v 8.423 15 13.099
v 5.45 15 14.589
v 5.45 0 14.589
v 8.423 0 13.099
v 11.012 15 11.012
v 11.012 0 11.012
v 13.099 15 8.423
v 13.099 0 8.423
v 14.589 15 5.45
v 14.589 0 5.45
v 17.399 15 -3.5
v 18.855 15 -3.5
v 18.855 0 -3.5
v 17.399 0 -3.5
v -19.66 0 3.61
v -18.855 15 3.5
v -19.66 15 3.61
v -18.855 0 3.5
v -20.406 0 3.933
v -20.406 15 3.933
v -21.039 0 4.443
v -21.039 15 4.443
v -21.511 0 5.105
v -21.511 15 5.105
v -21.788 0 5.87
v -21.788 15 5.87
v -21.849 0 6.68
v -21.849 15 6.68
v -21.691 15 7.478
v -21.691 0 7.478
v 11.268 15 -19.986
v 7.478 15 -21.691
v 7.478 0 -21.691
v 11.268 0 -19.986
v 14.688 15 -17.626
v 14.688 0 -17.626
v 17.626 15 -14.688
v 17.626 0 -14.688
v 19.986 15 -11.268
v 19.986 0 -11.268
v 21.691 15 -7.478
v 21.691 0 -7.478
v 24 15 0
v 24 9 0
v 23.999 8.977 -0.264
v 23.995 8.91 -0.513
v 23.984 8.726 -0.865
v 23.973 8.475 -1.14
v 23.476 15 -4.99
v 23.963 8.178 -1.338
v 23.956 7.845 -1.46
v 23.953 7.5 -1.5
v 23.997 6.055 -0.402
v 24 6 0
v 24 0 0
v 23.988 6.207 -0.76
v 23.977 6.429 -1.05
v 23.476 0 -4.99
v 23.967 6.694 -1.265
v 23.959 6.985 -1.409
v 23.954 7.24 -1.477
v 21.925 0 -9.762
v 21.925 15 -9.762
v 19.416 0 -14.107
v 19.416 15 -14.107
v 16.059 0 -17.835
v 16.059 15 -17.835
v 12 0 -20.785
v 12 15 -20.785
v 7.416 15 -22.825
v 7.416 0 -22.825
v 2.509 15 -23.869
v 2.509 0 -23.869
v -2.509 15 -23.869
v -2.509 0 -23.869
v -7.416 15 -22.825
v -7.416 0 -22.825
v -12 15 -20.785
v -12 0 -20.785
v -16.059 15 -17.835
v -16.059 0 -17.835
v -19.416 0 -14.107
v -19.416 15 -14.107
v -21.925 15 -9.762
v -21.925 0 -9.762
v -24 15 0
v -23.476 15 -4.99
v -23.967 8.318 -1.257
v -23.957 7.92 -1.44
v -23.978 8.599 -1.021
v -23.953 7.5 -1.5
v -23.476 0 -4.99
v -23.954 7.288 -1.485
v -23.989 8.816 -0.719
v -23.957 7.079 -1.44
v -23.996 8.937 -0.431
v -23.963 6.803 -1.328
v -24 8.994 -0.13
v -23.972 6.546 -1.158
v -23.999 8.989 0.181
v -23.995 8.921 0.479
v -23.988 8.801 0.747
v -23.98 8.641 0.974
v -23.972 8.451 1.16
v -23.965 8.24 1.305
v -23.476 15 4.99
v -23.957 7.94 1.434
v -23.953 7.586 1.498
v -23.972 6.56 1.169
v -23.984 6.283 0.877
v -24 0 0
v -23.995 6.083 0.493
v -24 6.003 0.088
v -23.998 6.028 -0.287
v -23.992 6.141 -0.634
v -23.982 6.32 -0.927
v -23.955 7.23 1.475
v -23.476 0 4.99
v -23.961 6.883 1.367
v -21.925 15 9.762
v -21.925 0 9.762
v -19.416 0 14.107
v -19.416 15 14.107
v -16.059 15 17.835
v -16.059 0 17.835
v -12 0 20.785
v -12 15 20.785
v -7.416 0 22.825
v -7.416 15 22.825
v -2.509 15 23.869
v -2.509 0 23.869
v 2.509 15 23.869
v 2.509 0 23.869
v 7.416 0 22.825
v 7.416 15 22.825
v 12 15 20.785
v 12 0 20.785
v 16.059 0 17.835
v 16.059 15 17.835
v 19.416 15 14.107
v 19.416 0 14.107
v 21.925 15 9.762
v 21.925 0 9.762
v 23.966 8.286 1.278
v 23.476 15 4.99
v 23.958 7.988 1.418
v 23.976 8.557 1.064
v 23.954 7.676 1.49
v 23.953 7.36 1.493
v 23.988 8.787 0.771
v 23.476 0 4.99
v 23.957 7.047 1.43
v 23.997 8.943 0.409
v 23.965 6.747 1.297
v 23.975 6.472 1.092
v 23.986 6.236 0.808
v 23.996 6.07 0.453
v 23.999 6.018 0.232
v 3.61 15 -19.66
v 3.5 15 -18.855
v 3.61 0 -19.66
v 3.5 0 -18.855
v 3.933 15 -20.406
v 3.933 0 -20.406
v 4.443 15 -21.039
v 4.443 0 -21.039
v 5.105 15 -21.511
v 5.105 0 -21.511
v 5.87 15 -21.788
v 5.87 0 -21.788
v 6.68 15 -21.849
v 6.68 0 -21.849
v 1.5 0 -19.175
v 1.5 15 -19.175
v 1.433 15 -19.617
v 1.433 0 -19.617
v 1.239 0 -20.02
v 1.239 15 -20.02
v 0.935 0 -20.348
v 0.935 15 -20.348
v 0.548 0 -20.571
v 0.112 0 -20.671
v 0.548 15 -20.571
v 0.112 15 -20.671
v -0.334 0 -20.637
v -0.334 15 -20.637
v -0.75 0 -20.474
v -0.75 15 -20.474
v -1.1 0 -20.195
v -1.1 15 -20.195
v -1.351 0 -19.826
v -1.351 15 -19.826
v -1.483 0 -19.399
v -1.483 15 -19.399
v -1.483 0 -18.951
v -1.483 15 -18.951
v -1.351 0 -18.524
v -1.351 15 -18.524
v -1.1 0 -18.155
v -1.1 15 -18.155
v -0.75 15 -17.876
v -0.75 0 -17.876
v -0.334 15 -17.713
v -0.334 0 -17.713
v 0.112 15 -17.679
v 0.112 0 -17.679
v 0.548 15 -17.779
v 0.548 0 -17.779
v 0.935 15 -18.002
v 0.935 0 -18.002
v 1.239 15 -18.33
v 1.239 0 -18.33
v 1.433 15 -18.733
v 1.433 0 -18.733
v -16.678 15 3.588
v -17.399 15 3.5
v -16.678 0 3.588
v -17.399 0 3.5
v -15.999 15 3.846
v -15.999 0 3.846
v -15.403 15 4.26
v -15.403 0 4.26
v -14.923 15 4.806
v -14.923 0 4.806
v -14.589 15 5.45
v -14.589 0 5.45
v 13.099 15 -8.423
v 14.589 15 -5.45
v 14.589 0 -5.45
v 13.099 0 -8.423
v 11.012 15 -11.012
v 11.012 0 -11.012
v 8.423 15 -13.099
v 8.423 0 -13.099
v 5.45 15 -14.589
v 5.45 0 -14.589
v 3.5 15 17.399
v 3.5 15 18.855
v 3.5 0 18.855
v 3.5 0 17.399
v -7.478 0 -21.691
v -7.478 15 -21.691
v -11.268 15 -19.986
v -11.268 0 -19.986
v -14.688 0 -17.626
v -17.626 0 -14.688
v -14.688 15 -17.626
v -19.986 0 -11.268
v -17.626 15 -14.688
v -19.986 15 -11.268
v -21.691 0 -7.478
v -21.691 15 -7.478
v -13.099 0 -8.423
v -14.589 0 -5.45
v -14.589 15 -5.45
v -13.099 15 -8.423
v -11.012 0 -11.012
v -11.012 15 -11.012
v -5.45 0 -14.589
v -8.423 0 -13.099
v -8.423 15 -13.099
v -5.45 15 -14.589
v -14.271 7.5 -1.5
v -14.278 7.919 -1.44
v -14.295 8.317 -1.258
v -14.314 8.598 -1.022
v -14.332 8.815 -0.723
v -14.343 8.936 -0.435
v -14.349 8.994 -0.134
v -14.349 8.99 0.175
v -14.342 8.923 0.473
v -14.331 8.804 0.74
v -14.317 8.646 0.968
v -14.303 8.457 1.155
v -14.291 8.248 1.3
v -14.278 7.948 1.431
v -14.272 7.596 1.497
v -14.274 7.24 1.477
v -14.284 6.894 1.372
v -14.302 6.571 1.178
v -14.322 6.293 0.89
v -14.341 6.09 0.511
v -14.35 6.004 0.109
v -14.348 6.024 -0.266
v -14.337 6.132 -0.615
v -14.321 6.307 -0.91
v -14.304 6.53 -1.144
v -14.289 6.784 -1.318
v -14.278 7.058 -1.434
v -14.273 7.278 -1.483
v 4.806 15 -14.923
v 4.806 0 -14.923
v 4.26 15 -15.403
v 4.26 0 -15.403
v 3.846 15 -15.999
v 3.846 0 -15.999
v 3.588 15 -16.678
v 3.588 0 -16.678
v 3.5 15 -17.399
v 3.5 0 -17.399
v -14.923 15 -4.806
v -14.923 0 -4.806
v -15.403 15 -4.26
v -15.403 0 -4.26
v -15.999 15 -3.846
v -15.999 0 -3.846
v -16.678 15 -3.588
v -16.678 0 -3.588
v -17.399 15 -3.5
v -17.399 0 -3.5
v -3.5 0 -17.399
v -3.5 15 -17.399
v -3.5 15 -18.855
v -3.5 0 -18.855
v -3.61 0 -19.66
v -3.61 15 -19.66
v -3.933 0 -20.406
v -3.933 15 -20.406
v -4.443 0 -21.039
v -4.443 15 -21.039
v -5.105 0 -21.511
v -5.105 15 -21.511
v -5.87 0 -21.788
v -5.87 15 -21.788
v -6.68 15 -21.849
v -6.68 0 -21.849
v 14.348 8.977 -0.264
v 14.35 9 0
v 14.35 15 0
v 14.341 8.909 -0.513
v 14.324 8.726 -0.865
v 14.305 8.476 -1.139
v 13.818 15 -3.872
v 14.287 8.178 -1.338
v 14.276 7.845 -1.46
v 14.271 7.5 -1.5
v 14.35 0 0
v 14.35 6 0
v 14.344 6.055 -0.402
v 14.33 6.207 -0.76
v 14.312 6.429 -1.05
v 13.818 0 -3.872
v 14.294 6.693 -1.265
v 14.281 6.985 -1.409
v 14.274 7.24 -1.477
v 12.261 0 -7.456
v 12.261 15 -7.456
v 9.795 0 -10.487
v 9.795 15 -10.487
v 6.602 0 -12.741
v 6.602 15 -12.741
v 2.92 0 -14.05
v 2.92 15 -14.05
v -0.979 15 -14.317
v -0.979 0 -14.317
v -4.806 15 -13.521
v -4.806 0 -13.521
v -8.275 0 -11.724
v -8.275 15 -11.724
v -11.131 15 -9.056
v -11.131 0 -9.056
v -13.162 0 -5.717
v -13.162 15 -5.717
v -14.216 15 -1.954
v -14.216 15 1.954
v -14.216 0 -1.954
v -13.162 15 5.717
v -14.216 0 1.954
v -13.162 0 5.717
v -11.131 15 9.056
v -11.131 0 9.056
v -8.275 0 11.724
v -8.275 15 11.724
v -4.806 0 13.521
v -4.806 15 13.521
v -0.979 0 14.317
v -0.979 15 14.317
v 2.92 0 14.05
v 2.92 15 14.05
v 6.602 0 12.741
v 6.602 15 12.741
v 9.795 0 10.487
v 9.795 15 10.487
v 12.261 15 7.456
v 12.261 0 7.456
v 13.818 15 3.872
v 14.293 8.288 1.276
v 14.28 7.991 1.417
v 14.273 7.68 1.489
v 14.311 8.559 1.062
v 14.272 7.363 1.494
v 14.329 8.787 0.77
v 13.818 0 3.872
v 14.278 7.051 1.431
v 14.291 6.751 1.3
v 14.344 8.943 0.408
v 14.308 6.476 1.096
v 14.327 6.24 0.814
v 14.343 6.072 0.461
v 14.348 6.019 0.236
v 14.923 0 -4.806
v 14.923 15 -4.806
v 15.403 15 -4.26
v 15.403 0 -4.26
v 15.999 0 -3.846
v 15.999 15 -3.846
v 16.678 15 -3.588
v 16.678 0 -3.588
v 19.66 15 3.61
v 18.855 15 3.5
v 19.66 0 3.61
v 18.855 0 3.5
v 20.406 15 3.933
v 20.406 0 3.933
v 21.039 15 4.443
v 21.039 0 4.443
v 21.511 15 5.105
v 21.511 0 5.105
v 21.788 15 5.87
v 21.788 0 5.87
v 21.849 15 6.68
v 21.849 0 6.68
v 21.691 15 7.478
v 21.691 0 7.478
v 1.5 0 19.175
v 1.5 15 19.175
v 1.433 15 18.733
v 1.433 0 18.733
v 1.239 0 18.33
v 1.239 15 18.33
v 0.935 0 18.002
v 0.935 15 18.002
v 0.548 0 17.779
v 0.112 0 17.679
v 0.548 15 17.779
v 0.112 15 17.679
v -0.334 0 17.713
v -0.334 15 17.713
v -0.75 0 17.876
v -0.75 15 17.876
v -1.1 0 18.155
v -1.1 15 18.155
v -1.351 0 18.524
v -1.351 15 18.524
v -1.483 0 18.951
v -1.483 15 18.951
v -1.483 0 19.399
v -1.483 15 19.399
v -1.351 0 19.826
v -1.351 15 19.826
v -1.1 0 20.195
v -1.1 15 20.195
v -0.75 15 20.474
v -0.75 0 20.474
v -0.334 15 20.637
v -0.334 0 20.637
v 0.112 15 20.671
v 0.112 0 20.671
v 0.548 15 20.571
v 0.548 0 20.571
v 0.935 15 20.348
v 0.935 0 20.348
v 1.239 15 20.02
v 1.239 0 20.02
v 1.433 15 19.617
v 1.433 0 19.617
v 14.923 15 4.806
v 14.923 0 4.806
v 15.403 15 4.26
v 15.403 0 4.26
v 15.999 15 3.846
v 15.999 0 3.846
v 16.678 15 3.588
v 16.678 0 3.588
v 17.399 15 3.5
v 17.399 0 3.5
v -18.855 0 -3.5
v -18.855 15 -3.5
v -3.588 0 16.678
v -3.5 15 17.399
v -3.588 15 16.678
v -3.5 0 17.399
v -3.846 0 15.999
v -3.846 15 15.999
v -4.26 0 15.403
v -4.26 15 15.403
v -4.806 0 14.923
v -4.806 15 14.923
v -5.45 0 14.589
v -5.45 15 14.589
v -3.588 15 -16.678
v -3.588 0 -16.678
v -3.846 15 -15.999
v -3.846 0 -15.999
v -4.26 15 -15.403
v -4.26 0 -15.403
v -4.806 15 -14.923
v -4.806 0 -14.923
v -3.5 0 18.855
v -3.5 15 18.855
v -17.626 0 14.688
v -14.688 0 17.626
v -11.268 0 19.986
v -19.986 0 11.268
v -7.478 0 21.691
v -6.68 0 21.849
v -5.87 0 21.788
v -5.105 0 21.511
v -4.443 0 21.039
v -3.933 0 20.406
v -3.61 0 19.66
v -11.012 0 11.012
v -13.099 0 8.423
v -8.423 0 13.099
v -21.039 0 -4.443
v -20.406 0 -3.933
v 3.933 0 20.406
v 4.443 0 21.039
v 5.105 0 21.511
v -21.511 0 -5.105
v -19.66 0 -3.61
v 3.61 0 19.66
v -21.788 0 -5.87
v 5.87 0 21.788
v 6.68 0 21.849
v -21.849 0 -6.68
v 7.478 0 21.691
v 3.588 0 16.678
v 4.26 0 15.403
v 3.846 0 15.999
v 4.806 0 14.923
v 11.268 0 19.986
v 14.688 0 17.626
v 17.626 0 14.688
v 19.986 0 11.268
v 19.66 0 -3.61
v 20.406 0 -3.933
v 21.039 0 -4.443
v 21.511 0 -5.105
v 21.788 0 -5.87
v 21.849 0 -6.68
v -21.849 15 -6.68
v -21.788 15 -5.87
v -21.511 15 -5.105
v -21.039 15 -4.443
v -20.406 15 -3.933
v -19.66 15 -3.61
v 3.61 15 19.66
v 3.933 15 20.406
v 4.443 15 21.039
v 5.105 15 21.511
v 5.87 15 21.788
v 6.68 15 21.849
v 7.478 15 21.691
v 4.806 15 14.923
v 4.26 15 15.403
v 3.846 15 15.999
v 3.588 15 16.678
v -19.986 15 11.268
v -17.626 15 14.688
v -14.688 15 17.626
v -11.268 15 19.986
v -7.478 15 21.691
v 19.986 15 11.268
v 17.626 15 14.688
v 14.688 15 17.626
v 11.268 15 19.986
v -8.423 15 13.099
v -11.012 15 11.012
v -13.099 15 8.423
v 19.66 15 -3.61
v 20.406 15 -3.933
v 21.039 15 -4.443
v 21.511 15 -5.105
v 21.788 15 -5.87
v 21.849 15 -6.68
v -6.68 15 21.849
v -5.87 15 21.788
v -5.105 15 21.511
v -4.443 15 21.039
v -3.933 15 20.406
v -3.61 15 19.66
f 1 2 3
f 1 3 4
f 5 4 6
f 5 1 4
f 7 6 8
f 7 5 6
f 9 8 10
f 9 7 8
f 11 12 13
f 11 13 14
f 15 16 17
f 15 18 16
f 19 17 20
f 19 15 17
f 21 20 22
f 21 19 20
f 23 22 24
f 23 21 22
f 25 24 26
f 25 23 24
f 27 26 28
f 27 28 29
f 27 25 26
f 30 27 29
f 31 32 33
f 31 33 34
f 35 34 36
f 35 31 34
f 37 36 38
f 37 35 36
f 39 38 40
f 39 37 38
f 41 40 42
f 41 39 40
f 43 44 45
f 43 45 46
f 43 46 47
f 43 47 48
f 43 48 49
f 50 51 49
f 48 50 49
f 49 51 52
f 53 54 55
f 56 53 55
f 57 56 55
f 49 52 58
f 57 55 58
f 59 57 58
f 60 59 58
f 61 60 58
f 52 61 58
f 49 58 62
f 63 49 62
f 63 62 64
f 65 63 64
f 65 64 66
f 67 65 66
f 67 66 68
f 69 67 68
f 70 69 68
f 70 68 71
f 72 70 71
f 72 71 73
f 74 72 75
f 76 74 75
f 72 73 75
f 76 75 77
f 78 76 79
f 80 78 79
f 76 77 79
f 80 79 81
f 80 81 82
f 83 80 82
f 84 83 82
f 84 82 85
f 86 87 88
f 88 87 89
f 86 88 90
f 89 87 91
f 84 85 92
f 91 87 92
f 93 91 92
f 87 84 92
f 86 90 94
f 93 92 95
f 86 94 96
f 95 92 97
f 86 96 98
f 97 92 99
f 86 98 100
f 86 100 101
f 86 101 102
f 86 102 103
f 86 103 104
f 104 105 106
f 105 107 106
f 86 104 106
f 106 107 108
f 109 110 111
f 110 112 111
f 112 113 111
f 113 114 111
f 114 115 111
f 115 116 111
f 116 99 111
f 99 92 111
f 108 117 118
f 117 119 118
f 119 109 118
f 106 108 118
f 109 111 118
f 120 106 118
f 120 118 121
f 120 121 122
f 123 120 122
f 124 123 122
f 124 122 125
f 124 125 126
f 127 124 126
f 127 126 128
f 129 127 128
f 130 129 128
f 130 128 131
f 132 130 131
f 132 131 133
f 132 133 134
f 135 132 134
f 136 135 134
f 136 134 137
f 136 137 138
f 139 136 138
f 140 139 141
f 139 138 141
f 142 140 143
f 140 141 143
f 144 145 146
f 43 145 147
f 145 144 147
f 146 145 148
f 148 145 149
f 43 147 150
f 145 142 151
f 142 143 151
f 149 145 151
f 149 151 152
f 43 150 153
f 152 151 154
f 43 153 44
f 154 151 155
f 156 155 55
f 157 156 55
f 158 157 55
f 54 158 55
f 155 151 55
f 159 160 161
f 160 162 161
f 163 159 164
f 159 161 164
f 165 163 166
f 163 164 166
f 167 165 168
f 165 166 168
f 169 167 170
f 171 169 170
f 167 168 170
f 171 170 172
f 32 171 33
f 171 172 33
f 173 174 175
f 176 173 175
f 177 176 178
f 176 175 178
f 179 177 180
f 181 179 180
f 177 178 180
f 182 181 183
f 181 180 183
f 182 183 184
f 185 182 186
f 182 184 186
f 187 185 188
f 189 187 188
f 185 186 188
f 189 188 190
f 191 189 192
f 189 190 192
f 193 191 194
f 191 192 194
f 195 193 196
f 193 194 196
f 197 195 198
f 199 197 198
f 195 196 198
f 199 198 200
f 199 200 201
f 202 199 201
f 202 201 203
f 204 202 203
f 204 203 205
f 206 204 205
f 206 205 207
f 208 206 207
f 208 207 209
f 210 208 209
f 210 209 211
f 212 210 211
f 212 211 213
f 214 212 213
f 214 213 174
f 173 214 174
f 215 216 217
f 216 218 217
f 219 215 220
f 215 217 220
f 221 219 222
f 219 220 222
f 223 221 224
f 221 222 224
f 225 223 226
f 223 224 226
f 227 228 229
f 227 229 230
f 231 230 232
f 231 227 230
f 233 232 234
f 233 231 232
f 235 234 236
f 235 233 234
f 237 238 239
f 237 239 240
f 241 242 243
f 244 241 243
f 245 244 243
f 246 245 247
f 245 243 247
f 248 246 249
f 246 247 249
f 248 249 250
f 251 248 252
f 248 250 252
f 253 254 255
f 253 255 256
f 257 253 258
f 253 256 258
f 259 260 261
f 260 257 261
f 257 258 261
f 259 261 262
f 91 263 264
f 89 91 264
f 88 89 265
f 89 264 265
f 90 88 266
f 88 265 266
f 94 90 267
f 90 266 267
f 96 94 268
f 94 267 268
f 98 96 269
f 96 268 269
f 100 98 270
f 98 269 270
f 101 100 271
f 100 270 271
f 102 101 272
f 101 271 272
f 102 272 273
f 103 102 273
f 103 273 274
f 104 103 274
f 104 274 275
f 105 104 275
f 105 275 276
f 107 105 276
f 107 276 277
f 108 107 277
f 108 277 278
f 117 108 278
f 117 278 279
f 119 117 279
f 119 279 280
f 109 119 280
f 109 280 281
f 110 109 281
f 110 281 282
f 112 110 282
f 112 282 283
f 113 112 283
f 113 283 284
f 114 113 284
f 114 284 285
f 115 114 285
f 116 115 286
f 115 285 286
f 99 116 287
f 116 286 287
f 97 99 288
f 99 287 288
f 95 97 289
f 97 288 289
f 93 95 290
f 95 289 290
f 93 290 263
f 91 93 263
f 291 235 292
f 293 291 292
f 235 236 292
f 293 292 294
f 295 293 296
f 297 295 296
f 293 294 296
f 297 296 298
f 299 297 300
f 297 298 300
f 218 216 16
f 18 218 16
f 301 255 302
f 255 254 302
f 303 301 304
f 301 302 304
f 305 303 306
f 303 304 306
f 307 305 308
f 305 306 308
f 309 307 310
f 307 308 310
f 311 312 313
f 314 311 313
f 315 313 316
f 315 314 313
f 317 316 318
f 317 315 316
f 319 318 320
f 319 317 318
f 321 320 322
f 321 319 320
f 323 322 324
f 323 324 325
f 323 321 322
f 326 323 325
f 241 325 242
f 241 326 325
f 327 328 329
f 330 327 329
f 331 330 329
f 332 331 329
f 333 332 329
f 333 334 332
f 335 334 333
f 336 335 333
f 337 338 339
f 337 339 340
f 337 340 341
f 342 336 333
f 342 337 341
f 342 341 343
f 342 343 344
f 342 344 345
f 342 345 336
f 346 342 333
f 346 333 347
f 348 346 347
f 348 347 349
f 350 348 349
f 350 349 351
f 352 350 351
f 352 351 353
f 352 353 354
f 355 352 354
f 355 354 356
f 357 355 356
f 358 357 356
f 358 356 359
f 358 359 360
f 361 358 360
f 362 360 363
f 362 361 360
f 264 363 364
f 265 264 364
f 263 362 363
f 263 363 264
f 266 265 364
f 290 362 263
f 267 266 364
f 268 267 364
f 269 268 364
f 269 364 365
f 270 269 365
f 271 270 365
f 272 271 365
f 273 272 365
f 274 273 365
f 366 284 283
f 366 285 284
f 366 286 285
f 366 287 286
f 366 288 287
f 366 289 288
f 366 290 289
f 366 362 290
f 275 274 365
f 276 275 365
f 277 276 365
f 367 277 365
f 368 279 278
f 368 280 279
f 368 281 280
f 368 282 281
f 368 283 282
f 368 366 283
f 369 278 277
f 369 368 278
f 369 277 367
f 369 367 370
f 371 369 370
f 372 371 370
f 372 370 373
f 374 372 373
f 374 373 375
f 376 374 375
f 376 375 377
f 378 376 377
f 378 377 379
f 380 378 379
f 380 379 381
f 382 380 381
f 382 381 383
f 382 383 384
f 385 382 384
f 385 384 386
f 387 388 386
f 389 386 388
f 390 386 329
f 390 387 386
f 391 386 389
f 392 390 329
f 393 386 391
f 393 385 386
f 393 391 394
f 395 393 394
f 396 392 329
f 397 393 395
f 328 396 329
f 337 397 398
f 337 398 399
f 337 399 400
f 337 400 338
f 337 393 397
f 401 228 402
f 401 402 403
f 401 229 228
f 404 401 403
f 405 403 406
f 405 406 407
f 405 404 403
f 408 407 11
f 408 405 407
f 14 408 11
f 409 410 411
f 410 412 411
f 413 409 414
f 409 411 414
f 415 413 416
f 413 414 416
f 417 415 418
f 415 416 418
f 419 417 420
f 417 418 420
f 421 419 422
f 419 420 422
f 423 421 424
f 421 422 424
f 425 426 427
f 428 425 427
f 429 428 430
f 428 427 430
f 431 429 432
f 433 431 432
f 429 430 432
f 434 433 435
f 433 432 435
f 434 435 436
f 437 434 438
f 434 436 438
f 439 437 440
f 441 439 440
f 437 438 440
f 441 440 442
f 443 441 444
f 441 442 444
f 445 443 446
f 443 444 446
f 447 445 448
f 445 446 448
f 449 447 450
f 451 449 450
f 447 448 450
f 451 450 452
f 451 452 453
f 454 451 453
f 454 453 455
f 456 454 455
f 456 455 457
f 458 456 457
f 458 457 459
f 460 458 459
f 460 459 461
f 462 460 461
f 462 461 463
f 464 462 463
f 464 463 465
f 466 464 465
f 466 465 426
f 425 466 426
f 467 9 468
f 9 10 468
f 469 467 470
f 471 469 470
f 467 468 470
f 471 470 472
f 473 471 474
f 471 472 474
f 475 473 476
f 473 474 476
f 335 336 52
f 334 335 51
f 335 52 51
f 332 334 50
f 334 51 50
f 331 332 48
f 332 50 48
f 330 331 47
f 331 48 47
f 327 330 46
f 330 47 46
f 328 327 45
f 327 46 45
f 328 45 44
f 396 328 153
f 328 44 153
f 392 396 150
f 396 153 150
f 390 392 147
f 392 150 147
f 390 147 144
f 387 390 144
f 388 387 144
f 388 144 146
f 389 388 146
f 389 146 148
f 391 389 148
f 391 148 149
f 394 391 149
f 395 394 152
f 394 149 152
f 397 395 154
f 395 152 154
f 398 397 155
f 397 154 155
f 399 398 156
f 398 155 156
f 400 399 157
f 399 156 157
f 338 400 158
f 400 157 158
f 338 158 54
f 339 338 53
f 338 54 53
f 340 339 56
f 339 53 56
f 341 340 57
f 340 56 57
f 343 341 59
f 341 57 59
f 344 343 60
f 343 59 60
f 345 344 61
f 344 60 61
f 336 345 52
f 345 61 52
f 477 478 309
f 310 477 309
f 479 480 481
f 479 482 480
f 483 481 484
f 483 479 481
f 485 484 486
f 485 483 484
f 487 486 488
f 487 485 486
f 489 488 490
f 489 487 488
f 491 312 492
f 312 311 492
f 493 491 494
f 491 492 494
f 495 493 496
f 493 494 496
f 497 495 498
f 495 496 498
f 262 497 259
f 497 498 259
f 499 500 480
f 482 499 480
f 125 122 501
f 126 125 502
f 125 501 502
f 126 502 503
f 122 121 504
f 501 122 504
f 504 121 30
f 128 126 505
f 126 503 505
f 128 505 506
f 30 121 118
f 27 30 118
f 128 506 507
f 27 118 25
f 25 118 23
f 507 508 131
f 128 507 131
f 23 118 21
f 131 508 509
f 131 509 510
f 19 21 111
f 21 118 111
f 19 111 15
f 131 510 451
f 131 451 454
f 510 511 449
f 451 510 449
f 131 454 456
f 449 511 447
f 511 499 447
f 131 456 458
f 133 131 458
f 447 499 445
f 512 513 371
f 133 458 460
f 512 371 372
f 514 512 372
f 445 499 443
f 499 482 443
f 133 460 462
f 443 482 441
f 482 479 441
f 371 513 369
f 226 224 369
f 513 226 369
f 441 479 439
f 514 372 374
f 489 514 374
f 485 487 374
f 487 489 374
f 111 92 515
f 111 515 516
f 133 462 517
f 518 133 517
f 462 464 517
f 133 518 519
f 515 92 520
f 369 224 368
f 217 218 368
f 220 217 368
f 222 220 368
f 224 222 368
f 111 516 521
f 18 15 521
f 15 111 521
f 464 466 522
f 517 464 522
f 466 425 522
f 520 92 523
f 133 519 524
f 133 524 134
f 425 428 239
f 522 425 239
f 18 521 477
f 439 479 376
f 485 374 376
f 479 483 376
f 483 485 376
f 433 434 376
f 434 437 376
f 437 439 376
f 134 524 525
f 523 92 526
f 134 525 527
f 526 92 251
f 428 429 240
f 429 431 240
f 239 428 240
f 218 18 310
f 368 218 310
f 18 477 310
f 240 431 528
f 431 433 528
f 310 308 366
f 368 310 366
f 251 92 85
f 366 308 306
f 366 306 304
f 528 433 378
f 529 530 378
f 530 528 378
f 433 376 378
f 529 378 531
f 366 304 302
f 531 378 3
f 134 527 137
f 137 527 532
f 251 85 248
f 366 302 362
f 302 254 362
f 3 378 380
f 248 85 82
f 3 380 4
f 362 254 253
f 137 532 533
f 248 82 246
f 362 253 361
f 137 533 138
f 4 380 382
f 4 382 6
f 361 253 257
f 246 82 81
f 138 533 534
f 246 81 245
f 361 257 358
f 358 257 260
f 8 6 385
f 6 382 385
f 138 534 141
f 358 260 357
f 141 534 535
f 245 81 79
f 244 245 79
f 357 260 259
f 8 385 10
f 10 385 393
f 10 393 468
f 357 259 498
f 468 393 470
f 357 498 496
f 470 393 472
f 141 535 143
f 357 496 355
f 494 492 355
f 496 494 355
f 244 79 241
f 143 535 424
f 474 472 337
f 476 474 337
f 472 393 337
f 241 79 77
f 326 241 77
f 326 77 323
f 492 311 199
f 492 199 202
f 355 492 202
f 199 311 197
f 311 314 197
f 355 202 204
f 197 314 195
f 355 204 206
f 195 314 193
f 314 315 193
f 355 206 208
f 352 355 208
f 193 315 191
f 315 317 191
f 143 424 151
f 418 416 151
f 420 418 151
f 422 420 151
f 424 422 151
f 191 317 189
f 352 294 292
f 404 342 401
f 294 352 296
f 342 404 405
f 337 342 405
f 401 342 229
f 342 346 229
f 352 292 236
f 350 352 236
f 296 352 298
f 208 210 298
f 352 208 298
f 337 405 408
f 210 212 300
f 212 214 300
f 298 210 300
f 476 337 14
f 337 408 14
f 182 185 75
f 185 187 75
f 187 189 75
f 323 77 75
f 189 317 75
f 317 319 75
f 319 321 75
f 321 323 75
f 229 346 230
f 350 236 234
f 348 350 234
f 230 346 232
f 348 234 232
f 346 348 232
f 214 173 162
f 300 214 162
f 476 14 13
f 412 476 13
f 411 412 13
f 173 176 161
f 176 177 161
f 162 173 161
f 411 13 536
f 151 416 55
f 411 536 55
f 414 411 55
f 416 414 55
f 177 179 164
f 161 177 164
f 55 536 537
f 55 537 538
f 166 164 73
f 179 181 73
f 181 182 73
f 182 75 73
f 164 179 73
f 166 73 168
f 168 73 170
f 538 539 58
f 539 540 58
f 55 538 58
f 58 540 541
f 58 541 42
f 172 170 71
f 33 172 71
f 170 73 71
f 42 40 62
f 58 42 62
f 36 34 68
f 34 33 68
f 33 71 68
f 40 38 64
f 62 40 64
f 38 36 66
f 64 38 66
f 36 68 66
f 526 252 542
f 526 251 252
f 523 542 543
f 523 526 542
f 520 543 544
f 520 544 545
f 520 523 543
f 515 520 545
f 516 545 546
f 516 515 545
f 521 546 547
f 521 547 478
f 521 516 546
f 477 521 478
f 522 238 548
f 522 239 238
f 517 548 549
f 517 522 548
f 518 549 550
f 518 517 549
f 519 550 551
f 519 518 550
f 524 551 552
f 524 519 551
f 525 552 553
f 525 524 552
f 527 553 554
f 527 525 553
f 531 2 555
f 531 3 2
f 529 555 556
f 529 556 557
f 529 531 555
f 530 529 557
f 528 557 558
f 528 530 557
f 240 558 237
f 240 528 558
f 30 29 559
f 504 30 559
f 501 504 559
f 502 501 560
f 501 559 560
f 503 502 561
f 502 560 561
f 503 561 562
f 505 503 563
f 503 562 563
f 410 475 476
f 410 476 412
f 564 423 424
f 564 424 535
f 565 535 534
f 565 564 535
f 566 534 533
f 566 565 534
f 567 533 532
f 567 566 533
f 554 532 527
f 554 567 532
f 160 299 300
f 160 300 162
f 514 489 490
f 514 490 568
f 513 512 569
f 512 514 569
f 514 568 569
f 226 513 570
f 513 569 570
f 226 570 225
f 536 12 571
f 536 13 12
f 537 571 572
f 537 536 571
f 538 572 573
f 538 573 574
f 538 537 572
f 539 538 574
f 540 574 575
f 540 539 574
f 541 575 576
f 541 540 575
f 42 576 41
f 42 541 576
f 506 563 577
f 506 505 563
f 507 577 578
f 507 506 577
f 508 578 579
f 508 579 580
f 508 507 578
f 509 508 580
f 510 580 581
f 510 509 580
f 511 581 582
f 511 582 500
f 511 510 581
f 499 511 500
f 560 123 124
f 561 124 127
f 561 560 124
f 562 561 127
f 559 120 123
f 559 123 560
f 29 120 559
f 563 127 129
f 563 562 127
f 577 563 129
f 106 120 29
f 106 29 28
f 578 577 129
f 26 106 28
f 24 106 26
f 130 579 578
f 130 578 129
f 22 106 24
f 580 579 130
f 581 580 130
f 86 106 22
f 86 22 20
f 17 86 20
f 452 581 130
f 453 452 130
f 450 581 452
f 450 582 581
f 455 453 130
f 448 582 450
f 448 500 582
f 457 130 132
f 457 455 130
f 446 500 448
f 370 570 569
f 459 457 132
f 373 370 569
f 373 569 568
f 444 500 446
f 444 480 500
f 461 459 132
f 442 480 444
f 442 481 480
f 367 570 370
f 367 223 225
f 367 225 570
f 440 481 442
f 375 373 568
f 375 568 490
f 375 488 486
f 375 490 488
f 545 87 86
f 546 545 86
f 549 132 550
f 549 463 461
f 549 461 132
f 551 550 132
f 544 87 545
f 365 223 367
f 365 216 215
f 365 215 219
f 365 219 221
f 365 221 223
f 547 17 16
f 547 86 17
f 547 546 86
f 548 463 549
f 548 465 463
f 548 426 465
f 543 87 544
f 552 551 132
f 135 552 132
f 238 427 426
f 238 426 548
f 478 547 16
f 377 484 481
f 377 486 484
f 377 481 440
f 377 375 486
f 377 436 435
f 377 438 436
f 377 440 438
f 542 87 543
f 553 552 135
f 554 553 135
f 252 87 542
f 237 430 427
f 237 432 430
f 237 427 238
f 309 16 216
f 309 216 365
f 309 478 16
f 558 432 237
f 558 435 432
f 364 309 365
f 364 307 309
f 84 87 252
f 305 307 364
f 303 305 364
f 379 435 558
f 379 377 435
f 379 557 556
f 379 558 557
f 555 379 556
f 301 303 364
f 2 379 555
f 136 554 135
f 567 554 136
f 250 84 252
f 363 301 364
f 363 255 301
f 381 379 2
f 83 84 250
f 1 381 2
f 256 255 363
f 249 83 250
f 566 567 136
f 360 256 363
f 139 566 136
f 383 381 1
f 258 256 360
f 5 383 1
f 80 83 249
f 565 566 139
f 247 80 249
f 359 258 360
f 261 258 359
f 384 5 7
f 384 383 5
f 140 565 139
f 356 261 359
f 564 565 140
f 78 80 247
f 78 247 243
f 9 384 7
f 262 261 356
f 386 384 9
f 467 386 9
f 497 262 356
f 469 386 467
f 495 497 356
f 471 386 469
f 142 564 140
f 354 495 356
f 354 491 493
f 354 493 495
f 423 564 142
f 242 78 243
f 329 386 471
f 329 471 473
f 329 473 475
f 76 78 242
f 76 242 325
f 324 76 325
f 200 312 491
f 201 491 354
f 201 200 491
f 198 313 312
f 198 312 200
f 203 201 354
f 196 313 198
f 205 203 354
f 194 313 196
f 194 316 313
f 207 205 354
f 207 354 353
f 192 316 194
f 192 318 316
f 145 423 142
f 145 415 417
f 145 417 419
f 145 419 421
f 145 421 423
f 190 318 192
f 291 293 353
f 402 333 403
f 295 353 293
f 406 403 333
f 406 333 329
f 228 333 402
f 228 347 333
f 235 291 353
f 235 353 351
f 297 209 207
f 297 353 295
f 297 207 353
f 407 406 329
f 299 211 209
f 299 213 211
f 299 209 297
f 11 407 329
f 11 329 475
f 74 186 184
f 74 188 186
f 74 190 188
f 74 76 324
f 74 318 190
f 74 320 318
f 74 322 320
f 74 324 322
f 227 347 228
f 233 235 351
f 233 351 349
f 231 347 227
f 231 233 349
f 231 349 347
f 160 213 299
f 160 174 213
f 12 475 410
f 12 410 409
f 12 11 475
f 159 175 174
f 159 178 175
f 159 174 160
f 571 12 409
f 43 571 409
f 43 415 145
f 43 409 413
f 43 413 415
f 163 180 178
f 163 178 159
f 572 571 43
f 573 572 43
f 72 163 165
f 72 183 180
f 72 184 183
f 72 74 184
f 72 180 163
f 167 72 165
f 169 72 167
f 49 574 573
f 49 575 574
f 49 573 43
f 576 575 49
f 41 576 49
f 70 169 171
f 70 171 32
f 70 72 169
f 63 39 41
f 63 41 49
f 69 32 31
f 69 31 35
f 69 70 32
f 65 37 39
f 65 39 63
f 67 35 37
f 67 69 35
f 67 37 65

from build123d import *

# Parameters (mm, degrees)
SKETCH3_R           = 24
SKETCH3_R_2         = 14.35
BOSS_EXTRUDE1_DEPTH = 15
CUT_EXTRUDE2_START  = 50
SKETCH4_R           = 1.5
CUT_EXTRUDE2_DEPTH  = 100
SKETCH5_R           = 1.5
CUT_EXTRUDE3_DEPTH  = 100
CUT_EXTRUDE6_DEPTH  = 26
CUT_EXTRUDE7_DEPTH  = 26
CUT_EXTRUDE8_DEPTH  = 26
CUT_EXTRUDE9_DEPTH  = 26
FILLET5_R           = 3


with BuildPart() as part:
    # Sketch3 → Boss-Extrude1 (new body)
    with BuildSketch(Plane(origin=(0, 0, 0), x_dir=(1, 0, 0), z_dir=(0, 1, 0))):
        Circle(SKETCH3_R)
        Circle(SKETCH3_R_2, mode=Mode.SUBTRACT)
    extrude(amount=BOSS_EXTRUDE1_DEPTH)

    # Sketch4 → Cut-Extrude2 (cut)
    with BuildSketch(Plane(origin=(0, 0, 0), x_dir=(0, 0, -1), z_dir=(1, 0, 0)).offset(CUT_EXTRUDE2_START)):
        with Locations((0, 7.5)):
            Circle(SKETCH4_R)
    extrude(amount=-CUT_EXTRUDE2_DEPTH, mode=Mode.SUBTRACT)

    # Sketch5 → Cut-Extrude3 (cut)
    with BuildSketch(Plane(origin=(0, 15, 0), x_dir=(1, 0, 0), z_dir=(0, 1, 0))):
        with Locations((0, 19.175)):
            Circle(SKETCH5_R)
        with Locations((0, -19.175)):
            Circle(SKETCH5_R)
    extrude(amount=-CUT_EXTRUDE3_DEPTH, mode=Mode.SUBTRACT)

    # Sketch7 → Cut-Extrude6 (cut)
    with BuildSketch(Plane(origin=(0, 15, 0), x_dir=(1, 0, 0), z_dir=(0, 1, 0))):
        with BuildLine():
            Line((3.5, 15.175), (3.5, 22.675))
            ThreePointArc((3.5, 22.675), (16.223526512, 16.223526512), (22.675, 3.5))
            Line((22.675, 3.5), (15.175, 3.5))
            ThreePointArc((15.175, 3.5), (11.012053056, 11.012053056), (3.5, 15.175))
        make_face()
    extrude(amount=-CUT_EXTRUDE6_DEPTH, mode=Mode.SUBTRACT)

    # Sketch9 → Cut-Extrude7 (cut)
    with BuildSketch(Plane(origin=(0, 15, 0), x_dir=(1, 0, 0), z_dir=(0, 1, 0))):
        with BuildLine():
            Line((15.175, -3.5), (22.675, -3.5))
            ThreePointArc((22.675, -3.5), (16.223526512, -16.223526512), (3.5, -22.675))
            Line((3.5, -22.675), (3.5, -15.175))
            ThreePointArc((3.5, -15.175), (11.012053056, -11.012053056), (15.175, -3.5))
        make_face()
    extrude(amount=-CUT_EXTRUDE7_DEPTH, mode=Mode.SUBTRACT)

    # Sketch10 → Cut-Extrude8 (cut)
    with BuildSketch(Plane(origin=(0, 15, 0), x_dir=(1, 0, 0), z_dir=(0, 1, 0))):
        with BuildLine():
            Line((-3.5, 15.175), (-3.5, 22.675))
            ThreePointArc((-3.5, 22.675), (-16.223526512, 16.223526512), (-22.675, 3.5))
            Line((-22.675, 3.5), (-15.175, 3.5))
            ThreePointArc((-15.175, 3.5), (-11.012053056, 11.012053056), (-3.5, 15.175))
        make_face()
    extrude(amount=-CUT_EXTRUDE8_DEPTH, mode=Mode.SUBTRACT)

    # Sketch11 → Cut-Extrude9 (cut)
    with BuildSketch(Plane(origin=(0, 15, 0), x_dir=(1, 0, 0), z_dir=(0, 1, 0))):
        with BuildLine():
            Line((-15.175, -3.5), (-22.675, -3.5))
            ThreePointArc((-22.675, -3.5), (-16.223526512, -16.223526512), (-3.5, -22.675))
            Line((-3.5, -22.675), (-3.5, -15.175))
            ThreePointArc((-3.5, -15.175), (-11.012053056, -11.012053056), (-15.175, -3.5))
        make_face()
    extrude(amount=-CUT_EXTRUDE9_DEPTH, mode=Mode.SUBTRACT)

    # Fillet5
    fillet5_edges = [part.edges().sort_by_distance(p)[0] for p in [
        (-3.5, 7.5, 22.675),
        (-22.675, 7.5, 3.5),
        (-15.175, 7.5, 3.5),
        (-3.5, 7.5, 15.175),
        (3.5, 7.5, -22.675),
        (22.675, 7.5, -3.5),
        (15.175, 7.5, -3.5),
        (3.5, 7.5, -15.175),
        (3.5, 7.5, 15.175),
        (15.175, 7.5, 3.5),
        (22.675, 7.5, 3.5),
        (3.5, 7.5, 22.675),
        (-3.5, 7.5, -15.175),
        (-15.175, 7.5, -3.5),
        (-22.675, 7.5, -3.5),
        (-3.5, 7.5, -22.675),
    ]]
    fillet(fillet5_edges, radius=FILLET5_R)


solid = part.part
